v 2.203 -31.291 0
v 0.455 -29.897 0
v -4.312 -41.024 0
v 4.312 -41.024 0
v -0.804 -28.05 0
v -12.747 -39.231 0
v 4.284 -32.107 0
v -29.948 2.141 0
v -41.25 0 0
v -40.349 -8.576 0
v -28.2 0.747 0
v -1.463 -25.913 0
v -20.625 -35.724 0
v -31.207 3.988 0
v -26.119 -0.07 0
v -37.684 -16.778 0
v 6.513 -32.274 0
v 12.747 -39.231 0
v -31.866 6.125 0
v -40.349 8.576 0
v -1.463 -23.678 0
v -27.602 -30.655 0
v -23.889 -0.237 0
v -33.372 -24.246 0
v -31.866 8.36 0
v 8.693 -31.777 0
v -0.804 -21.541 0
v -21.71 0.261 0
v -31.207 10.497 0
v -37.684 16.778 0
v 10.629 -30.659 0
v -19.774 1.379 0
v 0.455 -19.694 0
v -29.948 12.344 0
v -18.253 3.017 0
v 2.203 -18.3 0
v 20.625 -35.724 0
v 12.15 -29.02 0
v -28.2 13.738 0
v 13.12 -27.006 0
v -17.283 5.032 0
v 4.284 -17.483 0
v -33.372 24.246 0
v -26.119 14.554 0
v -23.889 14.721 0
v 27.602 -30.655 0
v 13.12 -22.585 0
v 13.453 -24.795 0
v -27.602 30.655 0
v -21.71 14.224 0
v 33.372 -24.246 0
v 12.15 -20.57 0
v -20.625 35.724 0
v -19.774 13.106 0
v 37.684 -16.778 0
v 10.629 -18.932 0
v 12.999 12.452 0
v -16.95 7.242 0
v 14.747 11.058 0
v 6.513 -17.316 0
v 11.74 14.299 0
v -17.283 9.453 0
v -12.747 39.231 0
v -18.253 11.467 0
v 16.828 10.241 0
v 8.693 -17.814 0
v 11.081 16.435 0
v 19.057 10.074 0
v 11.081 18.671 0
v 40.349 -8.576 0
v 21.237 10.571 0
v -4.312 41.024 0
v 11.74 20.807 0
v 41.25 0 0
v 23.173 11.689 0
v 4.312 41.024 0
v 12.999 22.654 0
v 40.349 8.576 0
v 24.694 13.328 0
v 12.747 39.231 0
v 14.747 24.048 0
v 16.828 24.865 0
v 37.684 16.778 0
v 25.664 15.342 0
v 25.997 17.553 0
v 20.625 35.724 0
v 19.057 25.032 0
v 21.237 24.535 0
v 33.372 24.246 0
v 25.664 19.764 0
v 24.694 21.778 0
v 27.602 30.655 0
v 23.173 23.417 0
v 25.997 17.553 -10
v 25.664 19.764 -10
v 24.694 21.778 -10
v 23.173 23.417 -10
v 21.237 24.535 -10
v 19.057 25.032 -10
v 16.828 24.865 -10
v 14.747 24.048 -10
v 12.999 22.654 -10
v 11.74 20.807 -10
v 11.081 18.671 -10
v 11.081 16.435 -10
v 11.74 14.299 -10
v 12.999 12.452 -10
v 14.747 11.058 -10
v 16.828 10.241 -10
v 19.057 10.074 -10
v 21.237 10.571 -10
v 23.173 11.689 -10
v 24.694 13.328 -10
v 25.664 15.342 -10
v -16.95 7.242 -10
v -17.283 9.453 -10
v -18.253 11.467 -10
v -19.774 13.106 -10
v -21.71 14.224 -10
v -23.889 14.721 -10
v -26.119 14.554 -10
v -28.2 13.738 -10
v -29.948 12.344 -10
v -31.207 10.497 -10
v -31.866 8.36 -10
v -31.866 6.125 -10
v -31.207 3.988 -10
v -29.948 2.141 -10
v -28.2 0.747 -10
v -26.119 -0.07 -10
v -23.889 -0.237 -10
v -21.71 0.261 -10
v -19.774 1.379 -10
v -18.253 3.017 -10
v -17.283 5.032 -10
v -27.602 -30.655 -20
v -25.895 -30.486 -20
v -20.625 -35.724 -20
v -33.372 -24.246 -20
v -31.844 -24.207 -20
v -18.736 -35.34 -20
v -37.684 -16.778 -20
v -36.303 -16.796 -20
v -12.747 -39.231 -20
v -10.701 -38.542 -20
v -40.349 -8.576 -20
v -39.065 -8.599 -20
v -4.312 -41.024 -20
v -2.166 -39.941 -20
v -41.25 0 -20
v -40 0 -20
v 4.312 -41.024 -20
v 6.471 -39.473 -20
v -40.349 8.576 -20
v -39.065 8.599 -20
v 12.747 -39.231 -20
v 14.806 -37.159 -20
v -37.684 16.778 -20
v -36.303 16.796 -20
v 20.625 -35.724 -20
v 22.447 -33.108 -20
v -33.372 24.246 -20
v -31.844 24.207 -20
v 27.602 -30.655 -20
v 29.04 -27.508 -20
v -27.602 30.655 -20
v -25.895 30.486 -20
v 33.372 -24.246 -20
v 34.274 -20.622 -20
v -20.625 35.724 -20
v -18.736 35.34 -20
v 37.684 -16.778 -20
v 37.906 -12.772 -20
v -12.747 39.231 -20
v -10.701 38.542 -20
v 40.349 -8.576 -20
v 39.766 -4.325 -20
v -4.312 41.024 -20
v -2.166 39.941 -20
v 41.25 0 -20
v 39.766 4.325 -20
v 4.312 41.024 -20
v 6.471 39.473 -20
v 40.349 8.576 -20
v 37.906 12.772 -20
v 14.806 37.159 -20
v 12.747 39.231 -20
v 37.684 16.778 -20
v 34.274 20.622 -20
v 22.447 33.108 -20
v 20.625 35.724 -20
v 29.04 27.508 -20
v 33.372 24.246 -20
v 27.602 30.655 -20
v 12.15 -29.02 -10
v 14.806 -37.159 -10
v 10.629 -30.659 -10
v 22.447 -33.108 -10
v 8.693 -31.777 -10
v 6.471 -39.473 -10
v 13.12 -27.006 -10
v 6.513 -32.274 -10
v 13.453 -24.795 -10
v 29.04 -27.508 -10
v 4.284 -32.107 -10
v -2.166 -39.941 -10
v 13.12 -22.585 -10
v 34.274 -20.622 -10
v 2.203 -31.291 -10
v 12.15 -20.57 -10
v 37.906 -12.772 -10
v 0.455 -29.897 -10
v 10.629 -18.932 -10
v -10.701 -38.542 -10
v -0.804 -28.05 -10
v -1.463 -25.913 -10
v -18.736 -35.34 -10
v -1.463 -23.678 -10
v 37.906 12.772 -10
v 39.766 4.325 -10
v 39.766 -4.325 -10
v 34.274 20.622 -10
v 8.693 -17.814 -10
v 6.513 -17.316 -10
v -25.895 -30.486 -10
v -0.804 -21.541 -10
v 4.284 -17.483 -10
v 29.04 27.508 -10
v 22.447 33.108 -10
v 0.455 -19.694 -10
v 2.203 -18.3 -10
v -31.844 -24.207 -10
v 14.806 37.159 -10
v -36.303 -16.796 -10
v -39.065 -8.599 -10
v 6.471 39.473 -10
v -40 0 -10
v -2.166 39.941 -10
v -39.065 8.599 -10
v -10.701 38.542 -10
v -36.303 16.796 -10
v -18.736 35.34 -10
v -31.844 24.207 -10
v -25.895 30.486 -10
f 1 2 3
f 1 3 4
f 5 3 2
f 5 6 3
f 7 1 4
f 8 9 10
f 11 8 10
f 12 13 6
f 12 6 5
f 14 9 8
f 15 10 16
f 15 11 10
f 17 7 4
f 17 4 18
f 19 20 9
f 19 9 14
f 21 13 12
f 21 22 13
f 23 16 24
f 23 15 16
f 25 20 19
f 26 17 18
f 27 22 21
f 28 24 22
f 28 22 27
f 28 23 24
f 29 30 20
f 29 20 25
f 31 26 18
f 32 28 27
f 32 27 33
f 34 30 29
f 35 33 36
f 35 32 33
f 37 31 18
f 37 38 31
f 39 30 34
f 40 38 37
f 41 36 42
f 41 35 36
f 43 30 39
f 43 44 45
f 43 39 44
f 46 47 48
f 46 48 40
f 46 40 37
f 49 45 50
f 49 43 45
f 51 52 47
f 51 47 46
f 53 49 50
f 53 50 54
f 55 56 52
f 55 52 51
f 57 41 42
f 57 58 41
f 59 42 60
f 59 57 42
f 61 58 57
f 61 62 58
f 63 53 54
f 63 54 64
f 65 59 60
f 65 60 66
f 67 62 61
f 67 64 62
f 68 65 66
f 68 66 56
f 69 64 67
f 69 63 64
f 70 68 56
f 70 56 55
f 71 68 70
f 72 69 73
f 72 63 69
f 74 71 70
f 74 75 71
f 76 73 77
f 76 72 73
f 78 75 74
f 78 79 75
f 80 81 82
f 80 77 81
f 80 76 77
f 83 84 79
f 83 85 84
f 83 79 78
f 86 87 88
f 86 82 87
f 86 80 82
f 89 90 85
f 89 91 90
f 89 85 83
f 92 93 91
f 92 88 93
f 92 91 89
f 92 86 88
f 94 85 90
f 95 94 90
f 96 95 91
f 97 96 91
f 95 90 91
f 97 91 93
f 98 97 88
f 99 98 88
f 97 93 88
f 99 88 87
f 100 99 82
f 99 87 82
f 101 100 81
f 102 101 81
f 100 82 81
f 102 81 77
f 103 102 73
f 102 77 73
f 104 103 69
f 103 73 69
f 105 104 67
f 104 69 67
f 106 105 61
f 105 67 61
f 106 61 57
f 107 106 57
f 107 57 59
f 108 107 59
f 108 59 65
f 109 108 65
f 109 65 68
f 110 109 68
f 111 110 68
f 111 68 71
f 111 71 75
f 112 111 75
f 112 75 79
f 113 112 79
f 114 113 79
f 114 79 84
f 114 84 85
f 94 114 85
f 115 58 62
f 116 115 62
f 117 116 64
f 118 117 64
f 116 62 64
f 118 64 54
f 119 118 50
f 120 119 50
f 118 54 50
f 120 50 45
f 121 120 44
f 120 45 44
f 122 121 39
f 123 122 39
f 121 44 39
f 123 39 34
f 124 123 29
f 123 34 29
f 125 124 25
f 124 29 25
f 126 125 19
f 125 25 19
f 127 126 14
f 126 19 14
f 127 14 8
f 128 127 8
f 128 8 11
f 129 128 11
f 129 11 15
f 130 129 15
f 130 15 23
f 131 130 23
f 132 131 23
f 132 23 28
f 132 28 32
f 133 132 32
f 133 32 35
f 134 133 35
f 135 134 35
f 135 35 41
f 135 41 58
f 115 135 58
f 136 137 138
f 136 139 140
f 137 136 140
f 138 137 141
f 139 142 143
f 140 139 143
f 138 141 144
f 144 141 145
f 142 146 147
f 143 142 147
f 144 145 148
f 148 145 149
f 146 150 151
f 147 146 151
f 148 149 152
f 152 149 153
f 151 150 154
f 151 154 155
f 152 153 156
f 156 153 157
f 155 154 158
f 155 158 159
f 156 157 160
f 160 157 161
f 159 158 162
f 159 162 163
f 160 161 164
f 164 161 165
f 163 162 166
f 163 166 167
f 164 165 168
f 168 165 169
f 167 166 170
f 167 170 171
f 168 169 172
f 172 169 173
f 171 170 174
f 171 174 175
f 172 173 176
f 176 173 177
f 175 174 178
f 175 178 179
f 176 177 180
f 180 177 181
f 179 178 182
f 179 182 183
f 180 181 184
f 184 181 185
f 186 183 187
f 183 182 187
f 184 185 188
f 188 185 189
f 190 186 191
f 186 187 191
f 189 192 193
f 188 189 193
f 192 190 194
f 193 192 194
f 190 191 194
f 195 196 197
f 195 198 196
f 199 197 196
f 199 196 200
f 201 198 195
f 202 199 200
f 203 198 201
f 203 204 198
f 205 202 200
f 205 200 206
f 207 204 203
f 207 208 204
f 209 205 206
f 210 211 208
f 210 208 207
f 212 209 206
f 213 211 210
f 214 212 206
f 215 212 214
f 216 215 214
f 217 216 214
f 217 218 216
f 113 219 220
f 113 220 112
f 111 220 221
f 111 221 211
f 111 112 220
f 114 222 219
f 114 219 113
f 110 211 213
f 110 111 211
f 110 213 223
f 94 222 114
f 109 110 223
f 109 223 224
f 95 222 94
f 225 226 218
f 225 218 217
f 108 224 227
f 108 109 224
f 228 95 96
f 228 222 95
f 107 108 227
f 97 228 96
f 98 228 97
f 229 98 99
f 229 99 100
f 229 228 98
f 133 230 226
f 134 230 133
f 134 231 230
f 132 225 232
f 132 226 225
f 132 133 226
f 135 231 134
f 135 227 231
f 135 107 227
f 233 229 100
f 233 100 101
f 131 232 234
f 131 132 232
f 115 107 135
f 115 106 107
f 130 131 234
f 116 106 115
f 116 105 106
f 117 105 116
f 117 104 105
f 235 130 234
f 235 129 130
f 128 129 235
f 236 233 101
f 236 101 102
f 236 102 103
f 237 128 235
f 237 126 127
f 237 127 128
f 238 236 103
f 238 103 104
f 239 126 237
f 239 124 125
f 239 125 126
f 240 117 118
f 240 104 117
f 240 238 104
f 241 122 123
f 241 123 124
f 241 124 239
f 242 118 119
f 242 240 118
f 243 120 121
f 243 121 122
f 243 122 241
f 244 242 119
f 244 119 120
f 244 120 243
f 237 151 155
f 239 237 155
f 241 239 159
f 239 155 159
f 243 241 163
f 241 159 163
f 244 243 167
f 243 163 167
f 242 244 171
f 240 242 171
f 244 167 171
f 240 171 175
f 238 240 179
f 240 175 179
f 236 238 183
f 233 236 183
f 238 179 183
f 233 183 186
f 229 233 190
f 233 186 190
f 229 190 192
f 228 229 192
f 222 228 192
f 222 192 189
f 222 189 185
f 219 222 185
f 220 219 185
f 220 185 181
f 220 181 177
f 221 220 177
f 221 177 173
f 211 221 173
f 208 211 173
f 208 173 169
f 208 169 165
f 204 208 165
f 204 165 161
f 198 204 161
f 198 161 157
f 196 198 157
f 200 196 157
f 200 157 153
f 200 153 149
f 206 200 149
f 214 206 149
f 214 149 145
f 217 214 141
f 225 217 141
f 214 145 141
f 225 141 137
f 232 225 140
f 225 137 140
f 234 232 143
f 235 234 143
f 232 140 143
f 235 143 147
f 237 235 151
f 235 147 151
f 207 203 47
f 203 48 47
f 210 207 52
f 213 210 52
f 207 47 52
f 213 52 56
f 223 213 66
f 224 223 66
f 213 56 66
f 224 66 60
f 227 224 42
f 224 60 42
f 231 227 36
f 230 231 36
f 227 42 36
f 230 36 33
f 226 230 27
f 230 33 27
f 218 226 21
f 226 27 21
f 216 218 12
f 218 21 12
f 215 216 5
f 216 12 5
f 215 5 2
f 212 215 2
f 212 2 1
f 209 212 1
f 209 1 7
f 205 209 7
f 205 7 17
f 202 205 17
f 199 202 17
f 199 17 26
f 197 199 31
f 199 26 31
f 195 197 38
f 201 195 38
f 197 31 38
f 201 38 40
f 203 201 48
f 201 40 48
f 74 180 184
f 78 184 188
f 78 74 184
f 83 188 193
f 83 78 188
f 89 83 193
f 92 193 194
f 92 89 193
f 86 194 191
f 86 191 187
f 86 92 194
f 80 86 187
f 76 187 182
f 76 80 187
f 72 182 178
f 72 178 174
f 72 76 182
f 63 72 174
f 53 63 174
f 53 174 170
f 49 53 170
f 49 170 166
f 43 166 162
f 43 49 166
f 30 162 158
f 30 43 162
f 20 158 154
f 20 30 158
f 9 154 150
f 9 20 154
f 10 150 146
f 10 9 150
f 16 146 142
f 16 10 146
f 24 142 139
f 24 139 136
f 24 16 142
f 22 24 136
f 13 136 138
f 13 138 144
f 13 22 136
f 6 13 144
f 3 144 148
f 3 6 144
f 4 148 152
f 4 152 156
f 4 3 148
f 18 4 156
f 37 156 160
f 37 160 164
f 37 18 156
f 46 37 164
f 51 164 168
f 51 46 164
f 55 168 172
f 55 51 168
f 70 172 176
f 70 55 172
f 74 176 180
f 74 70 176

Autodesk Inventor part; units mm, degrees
ref_plane "YZ Plane" through (0, 0, 0) normal (1, 0, 0) x (0, 1, 0)
ref_plane "XZ Plane" through (0, 0, 0) normal (0, 1, 0) x (-1, 0, 0)
ref_plane "XY Plane" through (0, 0, 0) normal (0, 0, 1) x (1, 0, 0)
sketch "Sketch1" plane through (0, 0, 0) normal (0, 0, 1) x (1, 0, 0)
  circle A0 centre (-24.4499, 7.2424) radius 7.5
  circle A1 centre (18.497, 17.553) radius 7.5
  circle A2 centre (5.9529, -24.7954) radius 7.5
  circle A3 centre (0, 0) radius 40
  circle A4 centre (0, 0) radius 41.25
  point P0 (0, 0)
  dimension "d9" = 82.5
extrude "Extrusion1" add sketch "Sketch1" against normal blind 20 contours A3 | A4
sketch "Sketch4" plane through (0, 0, -20) normal (0, 0, -1) x (-1, 0, 0)
  circle A0 centre (0, 0) radius 41.25 projected
  circle A1 centre (0, 0) radius 40
  point P0 (0, 0)
  dimension "d10" = 80
extrude "Extrusion4" cut sketch "Sketch4" against normal blind 10 contours A1
properties part number "Cover of gearbox 2"
